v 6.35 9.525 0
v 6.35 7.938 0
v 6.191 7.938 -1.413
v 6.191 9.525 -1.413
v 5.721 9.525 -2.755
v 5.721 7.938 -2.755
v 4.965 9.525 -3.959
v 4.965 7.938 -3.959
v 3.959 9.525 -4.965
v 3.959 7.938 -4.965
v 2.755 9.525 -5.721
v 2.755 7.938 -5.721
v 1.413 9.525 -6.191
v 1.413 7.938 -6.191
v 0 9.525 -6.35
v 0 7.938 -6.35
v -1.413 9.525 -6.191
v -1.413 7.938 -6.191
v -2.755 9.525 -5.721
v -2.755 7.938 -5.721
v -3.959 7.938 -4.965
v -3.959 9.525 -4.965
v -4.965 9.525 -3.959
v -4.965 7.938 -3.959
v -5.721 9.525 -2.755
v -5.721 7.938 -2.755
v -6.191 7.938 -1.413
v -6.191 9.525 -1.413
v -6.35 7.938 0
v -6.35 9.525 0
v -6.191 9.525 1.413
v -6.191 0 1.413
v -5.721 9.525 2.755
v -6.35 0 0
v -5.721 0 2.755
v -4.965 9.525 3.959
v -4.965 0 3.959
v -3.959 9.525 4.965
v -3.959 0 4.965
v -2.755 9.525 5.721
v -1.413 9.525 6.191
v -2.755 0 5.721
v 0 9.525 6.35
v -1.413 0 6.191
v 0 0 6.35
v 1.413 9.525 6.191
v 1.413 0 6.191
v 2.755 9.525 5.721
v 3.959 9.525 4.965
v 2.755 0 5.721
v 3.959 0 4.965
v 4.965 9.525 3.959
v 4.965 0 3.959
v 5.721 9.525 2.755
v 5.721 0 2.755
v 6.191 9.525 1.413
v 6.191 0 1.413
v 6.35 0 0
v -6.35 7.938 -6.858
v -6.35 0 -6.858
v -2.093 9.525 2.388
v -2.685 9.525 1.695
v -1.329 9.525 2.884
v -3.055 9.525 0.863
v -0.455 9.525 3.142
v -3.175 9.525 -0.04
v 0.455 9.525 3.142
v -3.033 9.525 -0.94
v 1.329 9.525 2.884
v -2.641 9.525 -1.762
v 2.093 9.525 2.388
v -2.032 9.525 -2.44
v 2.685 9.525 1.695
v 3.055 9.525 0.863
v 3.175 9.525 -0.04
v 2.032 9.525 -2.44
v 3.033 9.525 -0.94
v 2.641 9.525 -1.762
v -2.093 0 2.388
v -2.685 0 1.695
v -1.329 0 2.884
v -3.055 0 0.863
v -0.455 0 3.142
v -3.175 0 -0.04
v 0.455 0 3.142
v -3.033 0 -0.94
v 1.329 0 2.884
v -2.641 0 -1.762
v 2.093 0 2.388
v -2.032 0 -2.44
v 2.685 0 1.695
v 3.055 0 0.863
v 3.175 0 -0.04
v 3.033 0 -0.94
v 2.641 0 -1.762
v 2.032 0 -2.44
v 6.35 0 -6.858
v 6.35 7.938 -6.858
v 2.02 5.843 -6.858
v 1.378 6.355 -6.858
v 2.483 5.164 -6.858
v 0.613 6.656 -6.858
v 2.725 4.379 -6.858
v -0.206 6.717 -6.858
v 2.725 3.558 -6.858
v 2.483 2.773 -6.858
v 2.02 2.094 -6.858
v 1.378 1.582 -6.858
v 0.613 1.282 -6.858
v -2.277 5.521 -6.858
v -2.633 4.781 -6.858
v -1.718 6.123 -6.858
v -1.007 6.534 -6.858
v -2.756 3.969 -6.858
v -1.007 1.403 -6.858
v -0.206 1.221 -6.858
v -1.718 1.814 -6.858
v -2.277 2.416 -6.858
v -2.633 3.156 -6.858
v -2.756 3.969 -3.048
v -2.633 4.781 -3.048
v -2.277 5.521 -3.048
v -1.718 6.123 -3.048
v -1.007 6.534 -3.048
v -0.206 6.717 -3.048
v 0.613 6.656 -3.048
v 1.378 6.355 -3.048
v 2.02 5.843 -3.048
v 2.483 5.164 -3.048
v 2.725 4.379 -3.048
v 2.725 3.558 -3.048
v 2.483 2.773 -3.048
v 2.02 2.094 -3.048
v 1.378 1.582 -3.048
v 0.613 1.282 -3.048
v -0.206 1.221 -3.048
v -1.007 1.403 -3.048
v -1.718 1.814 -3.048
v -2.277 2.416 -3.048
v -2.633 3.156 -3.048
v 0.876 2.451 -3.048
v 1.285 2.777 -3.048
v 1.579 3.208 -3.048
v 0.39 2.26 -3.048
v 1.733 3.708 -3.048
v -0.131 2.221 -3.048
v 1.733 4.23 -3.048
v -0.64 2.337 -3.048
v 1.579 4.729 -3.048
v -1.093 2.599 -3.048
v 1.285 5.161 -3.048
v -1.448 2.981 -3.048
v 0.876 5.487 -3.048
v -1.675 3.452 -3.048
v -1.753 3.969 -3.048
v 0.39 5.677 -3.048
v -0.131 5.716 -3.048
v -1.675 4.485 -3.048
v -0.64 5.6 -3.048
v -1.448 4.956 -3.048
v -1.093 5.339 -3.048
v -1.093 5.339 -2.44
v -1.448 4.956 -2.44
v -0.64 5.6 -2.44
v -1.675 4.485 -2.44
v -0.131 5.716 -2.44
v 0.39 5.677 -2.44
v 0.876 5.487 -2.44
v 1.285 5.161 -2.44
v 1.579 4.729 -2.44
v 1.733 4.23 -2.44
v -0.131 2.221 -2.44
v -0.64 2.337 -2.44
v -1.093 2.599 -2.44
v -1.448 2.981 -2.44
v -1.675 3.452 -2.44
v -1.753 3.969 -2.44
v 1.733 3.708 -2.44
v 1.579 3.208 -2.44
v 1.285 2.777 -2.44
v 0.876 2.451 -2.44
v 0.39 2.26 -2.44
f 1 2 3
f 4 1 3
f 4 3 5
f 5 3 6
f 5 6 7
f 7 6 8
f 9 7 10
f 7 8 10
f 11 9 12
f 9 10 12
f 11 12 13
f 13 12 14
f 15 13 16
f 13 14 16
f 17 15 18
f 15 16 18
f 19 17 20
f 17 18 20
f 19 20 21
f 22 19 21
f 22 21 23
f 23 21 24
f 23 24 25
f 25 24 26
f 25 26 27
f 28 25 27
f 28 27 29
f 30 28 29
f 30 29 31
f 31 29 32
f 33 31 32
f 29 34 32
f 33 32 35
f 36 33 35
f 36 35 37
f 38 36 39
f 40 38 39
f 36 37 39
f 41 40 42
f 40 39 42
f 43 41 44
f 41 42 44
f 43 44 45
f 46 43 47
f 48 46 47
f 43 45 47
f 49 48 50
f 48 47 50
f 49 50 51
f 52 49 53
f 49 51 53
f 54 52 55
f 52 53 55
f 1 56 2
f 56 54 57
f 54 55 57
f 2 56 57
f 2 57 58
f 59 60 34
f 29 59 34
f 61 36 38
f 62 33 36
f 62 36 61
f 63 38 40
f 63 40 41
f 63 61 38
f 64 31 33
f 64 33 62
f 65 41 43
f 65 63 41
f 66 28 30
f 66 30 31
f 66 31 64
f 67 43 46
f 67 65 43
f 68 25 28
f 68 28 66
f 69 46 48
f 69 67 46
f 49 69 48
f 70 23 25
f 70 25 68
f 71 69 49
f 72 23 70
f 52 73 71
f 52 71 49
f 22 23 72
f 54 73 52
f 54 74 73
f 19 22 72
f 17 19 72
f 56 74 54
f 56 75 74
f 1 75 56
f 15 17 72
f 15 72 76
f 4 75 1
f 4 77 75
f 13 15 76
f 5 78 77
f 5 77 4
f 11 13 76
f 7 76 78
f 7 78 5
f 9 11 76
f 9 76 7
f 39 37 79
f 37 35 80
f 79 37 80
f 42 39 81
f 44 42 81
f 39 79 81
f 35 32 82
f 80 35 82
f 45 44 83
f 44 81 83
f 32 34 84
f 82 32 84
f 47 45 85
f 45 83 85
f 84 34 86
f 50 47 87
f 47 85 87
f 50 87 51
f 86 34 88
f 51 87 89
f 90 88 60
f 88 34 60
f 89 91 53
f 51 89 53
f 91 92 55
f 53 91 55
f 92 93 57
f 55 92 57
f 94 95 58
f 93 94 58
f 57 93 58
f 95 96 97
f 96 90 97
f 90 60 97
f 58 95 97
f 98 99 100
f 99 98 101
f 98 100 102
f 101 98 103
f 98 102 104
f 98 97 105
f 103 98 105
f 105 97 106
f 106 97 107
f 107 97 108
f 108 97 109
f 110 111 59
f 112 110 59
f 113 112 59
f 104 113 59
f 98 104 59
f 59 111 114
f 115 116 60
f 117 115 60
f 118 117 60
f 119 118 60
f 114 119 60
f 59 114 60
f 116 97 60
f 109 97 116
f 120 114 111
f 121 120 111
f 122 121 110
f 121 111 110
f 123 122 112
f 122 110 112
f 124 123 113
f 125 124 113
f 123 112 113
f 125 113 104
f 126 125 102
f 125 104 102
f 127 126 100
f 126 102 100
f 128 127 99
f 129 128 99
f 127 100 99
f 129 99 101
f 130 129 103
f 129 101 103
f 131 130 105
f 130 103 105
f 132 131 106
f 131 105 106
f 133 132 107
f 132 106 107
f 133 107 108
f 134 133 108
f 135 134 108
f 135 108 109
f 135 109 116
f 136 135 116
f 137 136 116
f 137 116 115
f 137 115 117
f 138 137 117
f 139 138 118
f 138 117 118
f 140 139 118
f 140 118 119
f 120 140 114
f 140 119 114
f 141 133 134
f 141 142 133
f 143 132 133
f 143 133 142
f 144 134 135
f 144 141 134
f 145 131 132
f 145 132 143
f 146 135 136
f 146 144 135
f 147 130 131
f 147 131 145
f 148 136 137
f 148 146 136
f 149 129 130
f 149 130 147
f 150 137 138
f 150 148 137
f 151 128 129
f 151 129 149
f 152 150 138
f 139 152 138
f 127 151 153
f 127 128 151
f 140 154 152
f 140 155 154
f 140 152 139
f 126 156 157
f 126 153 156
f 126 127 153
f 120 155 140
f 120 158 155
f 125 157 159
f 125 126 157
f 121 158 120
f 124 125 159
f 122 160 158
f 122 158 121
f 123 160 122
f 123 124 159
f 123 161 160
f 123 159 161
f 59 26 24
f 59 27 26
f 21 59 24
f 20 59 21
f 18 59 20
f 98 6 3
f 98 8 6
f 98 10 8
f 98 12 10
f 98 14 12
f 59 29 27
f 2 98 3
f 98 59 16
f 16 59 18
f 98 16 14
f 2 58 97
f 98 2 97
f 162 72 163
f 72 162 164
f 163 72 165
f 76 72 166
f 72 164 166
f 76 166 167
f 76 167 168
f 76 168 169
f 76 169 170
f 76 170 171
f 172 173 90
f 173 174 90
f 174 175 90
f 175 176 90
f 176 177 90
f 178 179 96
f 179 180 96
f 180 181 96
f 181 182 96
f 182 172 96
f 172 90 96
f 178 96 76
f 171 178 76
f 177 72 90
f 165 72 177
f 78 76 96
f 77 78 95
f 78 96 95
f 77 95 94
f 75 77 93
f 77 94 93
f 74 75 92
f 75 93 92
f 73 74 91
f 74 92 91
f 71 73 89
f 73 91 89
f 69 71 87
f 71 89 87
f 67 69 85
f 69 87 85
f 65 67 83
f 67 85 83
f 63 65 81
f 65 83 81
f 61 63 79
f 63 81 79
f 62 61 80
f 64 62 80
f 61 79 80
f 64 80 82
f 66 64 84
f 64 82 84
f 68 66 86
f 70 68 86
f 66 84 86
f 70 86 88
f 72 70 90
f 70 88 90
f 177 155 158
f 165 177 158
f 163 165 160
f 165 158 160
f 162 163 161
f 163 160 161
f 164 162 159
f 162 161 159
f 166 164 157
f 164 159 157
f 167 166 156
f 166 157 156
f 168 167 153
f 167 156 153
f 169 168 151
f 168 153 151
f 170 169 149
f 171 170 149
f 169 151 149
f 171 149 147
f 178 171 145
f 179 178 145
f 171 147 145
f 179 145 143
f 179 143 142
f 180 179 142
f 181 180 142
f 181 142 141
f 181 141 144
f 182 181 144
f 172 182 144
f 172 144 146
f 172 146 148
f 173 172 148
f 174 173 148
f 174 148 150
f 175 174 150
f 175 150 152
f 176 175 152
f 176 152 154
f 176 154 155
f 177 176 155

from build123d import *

# Parameters (mm, degrees)
BOSS_EXTRUDE1_DEPTH = 7.9375
SKETCH3_R           = 2.7559
CUT_EXTRUDE1_DEPTH  = 3.81
CUT_EXTRUDE2_REACH  = 11.398
SKETCH4_R           = 1.7526
SKETCH5_R           = 6.35
BOSS_EXTRUDE2_DEPTH = 1.5875


with BuildPart() as part:
    # Sketch1 → Boss-Extrude1 (new body)
    with BuildSketch(Plane(origin=(0, 0, 0), x_dir=(1, 0, 0), z_dir=(0, 1, 0))):
        with BuildLine():
            ThreePointArc((-6.35, 0), (0, -6.35), (6.35, 0))
            Line((6.35, 0), (6.35, 6.858))
            Line((6.35, 6.858), (-6.35, 6.858))
            Line((-6.35, 6.858), (-6.35, 0))
        make_face()
        with BuildLine():
            Line((-2.032, 2.439590334), (2.032, 2.439590334))
            ThreePointArc((2.032, 2.439590334), (0, -3.175), (-2.032, 2.439590334))
        make_face(mode=Mode.SUBTRACT)
    extrude(amount=BOSS_EXTRUDE1_DEPTH)

    # Sketch3 → Cut-Extrude1 (cut)
    with BuildSketch(Plane(origin=(0, 0, -6.858), x_dir=(-1, 0, 0), z_dir=(0, 0, -1))):
        with Locations((0, 3.96875)):
            Circle(SKETCH3_R)
    extrude(amount=-CUT_EXTRUDE1_DEPTH, mode=Mode.SUBTRACT)

    # Sketch4 → Cut-Extrude2 (cut, up to next)
    with BuildSketch(Plane(origin=(0, 0, -3.048), x_dir=(-1, 0, 0), z_dir=(0, 0, -1)), mode=Mode.PRIVATE) as cut_extrude2_sk1:
        with Locations((0, 3.96875)):
            Circle(SKETCH4_R)
    cut_extrude2_tool1 = extrude(cut_extrude2_sk1.sketch, amount=-CUT_EXTRUDE2_REACH, mode=Mode.PRIVATE) & part.part
    add(cut_extrude2_tool1.solids().sort_by_distance((0, 3.96875, -3.048))[0], mode=Mode.SUBTRACT)

    # Sketch5 → Boss-Extrude2 (add)
    with BuildSketch(Plane(origin=(0, 7.9375, 0), x_dir=(1, 0, 0), z_dir=(0, 1, 0))):
        Circle(SKETCH5_R)
        with BuildLine():
            Line((-2.032, 2.439590334), (2.032, 2.439590334))
            ThreePointArc((2.032, 2.439590334), (0, -3.175), (-2.032, 2.439590334))
        make_face(mode=Mode.SUBTRACT)
    extrude(amount=BOSS_EXTRUDE2_DEPTH)


solid = part.part
